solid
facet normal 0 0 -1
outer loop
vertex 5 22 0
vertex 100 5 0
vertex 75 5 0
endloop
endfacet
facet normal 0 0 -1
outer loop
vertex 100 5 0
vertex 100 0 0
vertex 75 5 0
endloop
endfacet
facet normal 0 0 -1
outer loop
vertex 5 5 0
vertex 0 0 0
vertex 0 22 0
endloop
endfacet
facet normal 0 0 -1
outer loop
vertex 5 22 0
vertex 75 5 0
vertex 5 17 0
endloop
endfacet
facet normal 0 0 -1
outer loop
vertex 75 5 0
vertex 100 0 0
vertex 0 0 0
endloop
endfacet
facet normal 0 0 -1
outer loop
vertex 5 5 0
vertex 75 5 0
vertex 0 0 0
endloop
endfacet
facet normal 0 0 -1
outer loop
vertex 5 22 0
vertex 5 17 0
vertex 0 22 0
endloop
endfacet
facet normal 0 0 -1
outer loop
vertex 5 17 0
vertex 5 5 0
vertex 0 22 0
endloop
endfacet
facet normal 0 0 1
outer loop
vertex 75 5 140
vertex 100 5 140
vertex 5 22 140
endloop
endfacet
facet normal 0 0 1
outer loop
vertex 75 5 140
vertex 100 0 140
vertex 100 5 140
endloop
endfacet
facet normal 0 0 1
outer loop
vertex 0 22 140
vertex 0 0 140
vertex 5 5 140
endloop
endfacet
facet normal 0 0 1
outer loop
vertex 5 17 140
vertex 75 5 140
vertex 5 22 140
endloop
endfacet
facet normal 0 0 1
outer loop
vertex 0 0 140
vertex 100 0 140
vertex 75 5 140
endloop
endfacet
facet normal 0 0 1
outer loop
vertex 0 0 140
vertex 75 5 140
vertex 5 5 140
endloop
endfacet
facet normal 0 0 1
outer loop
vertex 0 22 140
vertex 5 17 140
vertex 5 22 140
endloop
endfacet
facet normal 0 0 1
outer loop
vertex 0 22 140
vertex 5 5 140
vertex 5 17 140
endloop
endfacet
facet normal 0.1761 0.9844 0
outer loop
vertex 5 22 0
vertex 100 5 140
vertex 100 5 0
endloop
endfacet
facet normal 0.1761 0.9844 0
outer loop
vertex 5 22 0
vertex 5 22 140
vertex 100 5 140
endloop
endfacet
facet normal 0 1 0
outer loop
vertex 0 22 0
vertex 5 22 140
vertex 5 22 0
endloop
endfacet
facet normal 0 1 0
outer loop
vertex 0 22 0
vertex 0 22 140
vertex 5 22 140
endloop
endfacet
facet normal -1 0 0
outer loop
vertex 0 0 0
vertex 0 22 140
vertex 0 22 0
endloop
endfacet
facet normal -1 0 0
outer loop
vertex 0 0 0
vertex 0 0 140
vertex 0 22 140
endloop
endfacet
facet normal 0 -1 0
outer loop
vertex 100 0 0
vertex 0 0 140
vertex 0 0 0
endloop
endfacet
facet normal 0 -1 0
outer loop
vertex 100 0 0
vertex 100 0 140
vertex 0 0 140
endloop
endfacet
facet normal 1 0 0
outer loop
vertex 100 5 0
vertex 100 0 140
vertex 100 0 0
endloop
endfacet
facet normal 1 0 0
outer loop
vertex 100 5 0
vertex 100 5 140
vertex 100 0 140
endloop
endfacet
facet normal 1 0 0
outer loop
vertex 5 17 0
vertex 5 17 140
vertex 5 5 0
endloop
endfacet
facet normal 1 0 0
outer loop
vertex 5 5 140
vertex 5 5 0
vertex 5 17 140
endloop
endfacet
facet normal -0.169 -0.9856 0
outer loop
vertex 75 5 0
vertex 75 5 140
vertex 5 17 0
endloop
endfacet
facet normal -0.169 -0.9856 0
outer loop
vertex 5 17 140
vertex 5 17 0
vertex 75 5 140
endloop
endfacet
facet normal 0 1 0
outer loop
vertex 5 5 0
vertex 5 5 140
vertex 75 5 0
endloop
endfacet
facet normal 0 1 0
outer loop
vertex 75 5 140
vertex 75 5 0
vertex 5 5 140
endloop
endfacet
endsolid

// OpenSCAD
height = 22;
length = 100;
width = 140;
bezel = 5;

// rotate([90, 0, 0])
linear_extrude(width)
difference() {
	polygon([
		[0 , 0],
		[0, height],
		[bezel, height],
		[length, bezel],
		[length, 0],
	]);
	polygon([
		[bezel, bezel],
		[bezel, height - bezel],
		[length - bezel * bezel, bezel],
	]);
}
